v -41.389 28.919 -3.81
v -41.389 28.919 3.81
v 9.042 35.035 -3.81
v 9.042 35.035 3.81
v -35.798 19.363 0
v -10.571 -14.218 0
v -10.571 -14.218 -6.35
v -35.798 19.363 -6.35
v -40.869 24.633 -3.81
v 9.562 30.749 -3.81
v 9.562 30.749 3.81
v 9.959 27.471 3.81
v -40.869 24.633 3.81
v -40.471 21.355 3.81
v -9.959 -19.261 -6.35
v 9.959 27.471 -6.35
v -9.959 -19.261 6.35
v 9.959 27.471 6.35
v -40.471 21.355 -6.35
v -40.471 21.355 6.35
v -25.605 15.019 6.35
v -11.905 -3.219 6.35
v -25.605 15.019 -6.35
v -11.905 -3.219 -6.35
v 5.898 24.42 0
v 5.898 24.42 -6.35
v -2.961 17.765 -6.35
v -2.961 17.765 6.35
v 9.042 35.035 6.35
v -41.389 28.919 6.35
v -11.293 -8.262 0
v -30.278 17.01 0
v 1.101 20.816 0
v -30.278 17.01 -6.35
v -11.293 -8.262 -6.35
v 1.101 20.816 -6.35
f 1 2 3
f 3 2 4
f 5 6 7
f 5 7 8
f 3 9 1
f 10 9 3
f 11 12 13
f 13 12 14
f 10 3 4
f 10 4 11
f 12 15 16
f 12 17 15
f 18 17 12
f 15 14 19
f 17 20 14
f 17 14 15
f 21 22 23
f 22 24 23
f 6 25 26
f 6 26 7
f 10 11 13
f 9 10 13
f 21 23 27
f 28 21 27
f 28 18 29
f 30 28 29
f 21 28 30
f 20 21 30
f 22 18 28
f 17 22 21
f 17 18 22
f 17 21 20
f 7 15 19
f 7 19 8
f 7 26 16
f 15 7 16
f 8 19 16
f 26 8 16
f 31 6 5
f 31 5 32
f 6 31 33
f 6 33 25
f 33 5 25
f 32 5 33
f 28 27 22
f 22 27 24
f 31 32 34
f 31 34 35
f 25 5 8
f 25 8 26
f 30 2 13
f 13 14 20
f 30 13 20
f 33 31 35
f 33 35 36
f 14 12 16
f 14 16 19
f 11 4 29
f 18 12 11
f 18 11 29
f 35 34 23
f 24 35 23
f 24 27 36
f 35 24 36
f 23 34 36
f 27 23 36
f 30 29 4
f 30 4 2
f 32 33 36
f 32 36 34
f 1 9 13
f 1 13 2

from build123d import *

# Parameters (mm, degrees)
F1_DEPTH = 6.35
F2_DEPTH = 6.35
F3_W     = 50.8
F3_H     = 2.54
F4_DEPTH = 7.62
F6_DEPTH = 7.62


with BuildPart() as f1:
    # F0 (on Top) → F1 (new body)
    with BuildSketch(Plane.XY):
        Polygon((-9.9593002213, -19.26124861), (9.9593002213, 27.47085338), (-40.4711874956, 21.3548163761), align=None)
        Polygon((-10.5709039217, -14.2181998383), (-35.7979772966, 19.3629563319), (5.8976937227, 24.4196646526), align=None, mode=Mode.SUBTRACT)
        Polygon((5.8976937227, 24.4196646526), (-35.7979772966, 19.3629563319), (-10.5709039217, -14.2181998383), align=None)
        Polygon((-11.293270497, -8.2618430214), (-30.2784376915, 17.0103657284), (1.1005206928, 20.8158984391), align=None, mode=Mode.SUBTRACT)
        Polygon((1.1005206928, 20.8158984391), (-30.2784376915, 17.0103657284), (-11.293270497, -8.2618430214), align=None)
        Polygon((-11.9048741973, -3.2187942497), (-25.6052274925, 15.0185056841), (-2.9610858058, 17.7647097116), align=None, mode=Mode.SUBTRACT)
    extrude(amount=F1_DEPTH)

    # F0 (on Top) → F2 (join)
    with BuildSketch(Plane.XY):
        Polygon((-9.9593002213, -19.26124861), (9.9593002213, 27.47085338), (-40.4711874956, 21.3548163761), align=None)
        Polygon((-10.5709039217, -14.2181998383), (-35.7979772966, 19.3629563319), (5.8976937227, 24.4196646526), align=None, mode=Mode.SUBTRACT)
        Polygon((1.1005206928, 20.8158984391), (-30.2784376915, 17.0103657284), (-11.293270497, -8.2618430214), align=None)
        Polygon((-11.9048741973, -3.2187942497), (-25.6052274925, 15.0185056841), (-2.9610858058, 17.7647097116), align=None, mode=Mode.SUBTRACT)
    extrude(amount=-F2_DEPTH)

    # F3 (on face) → F4 (join)
    with BuildSketch(Plane(origin=(-3.1389223385, 25.8823457631, 0), x_dir=(-0.9927261362, -0.1203944292, 0), z_dir=(-0.1203944292, 0.9927261362, 0))):
        with Locations((12.2058046598, 5.08)):
            Rectangle(F3_W, F3_H)
    extrude(amount=F4_DEPTH)

    # F5 (on face) → F6 (join)
    with BuildSketch(Plane(origin=(0, 0, 3.81), x_dir=(1, 0, 0), z_dir=(0, 0, -1))):
        Polygon((9.5617578161, -30.7488350816), (-40.8687299009, -24.6327980777), (-41.3885930462, -28.9193895337), (9.0418946707, -35.0354265375), align=None)
    extrude(amount=F6_DEPTH)


solid = f1.part
